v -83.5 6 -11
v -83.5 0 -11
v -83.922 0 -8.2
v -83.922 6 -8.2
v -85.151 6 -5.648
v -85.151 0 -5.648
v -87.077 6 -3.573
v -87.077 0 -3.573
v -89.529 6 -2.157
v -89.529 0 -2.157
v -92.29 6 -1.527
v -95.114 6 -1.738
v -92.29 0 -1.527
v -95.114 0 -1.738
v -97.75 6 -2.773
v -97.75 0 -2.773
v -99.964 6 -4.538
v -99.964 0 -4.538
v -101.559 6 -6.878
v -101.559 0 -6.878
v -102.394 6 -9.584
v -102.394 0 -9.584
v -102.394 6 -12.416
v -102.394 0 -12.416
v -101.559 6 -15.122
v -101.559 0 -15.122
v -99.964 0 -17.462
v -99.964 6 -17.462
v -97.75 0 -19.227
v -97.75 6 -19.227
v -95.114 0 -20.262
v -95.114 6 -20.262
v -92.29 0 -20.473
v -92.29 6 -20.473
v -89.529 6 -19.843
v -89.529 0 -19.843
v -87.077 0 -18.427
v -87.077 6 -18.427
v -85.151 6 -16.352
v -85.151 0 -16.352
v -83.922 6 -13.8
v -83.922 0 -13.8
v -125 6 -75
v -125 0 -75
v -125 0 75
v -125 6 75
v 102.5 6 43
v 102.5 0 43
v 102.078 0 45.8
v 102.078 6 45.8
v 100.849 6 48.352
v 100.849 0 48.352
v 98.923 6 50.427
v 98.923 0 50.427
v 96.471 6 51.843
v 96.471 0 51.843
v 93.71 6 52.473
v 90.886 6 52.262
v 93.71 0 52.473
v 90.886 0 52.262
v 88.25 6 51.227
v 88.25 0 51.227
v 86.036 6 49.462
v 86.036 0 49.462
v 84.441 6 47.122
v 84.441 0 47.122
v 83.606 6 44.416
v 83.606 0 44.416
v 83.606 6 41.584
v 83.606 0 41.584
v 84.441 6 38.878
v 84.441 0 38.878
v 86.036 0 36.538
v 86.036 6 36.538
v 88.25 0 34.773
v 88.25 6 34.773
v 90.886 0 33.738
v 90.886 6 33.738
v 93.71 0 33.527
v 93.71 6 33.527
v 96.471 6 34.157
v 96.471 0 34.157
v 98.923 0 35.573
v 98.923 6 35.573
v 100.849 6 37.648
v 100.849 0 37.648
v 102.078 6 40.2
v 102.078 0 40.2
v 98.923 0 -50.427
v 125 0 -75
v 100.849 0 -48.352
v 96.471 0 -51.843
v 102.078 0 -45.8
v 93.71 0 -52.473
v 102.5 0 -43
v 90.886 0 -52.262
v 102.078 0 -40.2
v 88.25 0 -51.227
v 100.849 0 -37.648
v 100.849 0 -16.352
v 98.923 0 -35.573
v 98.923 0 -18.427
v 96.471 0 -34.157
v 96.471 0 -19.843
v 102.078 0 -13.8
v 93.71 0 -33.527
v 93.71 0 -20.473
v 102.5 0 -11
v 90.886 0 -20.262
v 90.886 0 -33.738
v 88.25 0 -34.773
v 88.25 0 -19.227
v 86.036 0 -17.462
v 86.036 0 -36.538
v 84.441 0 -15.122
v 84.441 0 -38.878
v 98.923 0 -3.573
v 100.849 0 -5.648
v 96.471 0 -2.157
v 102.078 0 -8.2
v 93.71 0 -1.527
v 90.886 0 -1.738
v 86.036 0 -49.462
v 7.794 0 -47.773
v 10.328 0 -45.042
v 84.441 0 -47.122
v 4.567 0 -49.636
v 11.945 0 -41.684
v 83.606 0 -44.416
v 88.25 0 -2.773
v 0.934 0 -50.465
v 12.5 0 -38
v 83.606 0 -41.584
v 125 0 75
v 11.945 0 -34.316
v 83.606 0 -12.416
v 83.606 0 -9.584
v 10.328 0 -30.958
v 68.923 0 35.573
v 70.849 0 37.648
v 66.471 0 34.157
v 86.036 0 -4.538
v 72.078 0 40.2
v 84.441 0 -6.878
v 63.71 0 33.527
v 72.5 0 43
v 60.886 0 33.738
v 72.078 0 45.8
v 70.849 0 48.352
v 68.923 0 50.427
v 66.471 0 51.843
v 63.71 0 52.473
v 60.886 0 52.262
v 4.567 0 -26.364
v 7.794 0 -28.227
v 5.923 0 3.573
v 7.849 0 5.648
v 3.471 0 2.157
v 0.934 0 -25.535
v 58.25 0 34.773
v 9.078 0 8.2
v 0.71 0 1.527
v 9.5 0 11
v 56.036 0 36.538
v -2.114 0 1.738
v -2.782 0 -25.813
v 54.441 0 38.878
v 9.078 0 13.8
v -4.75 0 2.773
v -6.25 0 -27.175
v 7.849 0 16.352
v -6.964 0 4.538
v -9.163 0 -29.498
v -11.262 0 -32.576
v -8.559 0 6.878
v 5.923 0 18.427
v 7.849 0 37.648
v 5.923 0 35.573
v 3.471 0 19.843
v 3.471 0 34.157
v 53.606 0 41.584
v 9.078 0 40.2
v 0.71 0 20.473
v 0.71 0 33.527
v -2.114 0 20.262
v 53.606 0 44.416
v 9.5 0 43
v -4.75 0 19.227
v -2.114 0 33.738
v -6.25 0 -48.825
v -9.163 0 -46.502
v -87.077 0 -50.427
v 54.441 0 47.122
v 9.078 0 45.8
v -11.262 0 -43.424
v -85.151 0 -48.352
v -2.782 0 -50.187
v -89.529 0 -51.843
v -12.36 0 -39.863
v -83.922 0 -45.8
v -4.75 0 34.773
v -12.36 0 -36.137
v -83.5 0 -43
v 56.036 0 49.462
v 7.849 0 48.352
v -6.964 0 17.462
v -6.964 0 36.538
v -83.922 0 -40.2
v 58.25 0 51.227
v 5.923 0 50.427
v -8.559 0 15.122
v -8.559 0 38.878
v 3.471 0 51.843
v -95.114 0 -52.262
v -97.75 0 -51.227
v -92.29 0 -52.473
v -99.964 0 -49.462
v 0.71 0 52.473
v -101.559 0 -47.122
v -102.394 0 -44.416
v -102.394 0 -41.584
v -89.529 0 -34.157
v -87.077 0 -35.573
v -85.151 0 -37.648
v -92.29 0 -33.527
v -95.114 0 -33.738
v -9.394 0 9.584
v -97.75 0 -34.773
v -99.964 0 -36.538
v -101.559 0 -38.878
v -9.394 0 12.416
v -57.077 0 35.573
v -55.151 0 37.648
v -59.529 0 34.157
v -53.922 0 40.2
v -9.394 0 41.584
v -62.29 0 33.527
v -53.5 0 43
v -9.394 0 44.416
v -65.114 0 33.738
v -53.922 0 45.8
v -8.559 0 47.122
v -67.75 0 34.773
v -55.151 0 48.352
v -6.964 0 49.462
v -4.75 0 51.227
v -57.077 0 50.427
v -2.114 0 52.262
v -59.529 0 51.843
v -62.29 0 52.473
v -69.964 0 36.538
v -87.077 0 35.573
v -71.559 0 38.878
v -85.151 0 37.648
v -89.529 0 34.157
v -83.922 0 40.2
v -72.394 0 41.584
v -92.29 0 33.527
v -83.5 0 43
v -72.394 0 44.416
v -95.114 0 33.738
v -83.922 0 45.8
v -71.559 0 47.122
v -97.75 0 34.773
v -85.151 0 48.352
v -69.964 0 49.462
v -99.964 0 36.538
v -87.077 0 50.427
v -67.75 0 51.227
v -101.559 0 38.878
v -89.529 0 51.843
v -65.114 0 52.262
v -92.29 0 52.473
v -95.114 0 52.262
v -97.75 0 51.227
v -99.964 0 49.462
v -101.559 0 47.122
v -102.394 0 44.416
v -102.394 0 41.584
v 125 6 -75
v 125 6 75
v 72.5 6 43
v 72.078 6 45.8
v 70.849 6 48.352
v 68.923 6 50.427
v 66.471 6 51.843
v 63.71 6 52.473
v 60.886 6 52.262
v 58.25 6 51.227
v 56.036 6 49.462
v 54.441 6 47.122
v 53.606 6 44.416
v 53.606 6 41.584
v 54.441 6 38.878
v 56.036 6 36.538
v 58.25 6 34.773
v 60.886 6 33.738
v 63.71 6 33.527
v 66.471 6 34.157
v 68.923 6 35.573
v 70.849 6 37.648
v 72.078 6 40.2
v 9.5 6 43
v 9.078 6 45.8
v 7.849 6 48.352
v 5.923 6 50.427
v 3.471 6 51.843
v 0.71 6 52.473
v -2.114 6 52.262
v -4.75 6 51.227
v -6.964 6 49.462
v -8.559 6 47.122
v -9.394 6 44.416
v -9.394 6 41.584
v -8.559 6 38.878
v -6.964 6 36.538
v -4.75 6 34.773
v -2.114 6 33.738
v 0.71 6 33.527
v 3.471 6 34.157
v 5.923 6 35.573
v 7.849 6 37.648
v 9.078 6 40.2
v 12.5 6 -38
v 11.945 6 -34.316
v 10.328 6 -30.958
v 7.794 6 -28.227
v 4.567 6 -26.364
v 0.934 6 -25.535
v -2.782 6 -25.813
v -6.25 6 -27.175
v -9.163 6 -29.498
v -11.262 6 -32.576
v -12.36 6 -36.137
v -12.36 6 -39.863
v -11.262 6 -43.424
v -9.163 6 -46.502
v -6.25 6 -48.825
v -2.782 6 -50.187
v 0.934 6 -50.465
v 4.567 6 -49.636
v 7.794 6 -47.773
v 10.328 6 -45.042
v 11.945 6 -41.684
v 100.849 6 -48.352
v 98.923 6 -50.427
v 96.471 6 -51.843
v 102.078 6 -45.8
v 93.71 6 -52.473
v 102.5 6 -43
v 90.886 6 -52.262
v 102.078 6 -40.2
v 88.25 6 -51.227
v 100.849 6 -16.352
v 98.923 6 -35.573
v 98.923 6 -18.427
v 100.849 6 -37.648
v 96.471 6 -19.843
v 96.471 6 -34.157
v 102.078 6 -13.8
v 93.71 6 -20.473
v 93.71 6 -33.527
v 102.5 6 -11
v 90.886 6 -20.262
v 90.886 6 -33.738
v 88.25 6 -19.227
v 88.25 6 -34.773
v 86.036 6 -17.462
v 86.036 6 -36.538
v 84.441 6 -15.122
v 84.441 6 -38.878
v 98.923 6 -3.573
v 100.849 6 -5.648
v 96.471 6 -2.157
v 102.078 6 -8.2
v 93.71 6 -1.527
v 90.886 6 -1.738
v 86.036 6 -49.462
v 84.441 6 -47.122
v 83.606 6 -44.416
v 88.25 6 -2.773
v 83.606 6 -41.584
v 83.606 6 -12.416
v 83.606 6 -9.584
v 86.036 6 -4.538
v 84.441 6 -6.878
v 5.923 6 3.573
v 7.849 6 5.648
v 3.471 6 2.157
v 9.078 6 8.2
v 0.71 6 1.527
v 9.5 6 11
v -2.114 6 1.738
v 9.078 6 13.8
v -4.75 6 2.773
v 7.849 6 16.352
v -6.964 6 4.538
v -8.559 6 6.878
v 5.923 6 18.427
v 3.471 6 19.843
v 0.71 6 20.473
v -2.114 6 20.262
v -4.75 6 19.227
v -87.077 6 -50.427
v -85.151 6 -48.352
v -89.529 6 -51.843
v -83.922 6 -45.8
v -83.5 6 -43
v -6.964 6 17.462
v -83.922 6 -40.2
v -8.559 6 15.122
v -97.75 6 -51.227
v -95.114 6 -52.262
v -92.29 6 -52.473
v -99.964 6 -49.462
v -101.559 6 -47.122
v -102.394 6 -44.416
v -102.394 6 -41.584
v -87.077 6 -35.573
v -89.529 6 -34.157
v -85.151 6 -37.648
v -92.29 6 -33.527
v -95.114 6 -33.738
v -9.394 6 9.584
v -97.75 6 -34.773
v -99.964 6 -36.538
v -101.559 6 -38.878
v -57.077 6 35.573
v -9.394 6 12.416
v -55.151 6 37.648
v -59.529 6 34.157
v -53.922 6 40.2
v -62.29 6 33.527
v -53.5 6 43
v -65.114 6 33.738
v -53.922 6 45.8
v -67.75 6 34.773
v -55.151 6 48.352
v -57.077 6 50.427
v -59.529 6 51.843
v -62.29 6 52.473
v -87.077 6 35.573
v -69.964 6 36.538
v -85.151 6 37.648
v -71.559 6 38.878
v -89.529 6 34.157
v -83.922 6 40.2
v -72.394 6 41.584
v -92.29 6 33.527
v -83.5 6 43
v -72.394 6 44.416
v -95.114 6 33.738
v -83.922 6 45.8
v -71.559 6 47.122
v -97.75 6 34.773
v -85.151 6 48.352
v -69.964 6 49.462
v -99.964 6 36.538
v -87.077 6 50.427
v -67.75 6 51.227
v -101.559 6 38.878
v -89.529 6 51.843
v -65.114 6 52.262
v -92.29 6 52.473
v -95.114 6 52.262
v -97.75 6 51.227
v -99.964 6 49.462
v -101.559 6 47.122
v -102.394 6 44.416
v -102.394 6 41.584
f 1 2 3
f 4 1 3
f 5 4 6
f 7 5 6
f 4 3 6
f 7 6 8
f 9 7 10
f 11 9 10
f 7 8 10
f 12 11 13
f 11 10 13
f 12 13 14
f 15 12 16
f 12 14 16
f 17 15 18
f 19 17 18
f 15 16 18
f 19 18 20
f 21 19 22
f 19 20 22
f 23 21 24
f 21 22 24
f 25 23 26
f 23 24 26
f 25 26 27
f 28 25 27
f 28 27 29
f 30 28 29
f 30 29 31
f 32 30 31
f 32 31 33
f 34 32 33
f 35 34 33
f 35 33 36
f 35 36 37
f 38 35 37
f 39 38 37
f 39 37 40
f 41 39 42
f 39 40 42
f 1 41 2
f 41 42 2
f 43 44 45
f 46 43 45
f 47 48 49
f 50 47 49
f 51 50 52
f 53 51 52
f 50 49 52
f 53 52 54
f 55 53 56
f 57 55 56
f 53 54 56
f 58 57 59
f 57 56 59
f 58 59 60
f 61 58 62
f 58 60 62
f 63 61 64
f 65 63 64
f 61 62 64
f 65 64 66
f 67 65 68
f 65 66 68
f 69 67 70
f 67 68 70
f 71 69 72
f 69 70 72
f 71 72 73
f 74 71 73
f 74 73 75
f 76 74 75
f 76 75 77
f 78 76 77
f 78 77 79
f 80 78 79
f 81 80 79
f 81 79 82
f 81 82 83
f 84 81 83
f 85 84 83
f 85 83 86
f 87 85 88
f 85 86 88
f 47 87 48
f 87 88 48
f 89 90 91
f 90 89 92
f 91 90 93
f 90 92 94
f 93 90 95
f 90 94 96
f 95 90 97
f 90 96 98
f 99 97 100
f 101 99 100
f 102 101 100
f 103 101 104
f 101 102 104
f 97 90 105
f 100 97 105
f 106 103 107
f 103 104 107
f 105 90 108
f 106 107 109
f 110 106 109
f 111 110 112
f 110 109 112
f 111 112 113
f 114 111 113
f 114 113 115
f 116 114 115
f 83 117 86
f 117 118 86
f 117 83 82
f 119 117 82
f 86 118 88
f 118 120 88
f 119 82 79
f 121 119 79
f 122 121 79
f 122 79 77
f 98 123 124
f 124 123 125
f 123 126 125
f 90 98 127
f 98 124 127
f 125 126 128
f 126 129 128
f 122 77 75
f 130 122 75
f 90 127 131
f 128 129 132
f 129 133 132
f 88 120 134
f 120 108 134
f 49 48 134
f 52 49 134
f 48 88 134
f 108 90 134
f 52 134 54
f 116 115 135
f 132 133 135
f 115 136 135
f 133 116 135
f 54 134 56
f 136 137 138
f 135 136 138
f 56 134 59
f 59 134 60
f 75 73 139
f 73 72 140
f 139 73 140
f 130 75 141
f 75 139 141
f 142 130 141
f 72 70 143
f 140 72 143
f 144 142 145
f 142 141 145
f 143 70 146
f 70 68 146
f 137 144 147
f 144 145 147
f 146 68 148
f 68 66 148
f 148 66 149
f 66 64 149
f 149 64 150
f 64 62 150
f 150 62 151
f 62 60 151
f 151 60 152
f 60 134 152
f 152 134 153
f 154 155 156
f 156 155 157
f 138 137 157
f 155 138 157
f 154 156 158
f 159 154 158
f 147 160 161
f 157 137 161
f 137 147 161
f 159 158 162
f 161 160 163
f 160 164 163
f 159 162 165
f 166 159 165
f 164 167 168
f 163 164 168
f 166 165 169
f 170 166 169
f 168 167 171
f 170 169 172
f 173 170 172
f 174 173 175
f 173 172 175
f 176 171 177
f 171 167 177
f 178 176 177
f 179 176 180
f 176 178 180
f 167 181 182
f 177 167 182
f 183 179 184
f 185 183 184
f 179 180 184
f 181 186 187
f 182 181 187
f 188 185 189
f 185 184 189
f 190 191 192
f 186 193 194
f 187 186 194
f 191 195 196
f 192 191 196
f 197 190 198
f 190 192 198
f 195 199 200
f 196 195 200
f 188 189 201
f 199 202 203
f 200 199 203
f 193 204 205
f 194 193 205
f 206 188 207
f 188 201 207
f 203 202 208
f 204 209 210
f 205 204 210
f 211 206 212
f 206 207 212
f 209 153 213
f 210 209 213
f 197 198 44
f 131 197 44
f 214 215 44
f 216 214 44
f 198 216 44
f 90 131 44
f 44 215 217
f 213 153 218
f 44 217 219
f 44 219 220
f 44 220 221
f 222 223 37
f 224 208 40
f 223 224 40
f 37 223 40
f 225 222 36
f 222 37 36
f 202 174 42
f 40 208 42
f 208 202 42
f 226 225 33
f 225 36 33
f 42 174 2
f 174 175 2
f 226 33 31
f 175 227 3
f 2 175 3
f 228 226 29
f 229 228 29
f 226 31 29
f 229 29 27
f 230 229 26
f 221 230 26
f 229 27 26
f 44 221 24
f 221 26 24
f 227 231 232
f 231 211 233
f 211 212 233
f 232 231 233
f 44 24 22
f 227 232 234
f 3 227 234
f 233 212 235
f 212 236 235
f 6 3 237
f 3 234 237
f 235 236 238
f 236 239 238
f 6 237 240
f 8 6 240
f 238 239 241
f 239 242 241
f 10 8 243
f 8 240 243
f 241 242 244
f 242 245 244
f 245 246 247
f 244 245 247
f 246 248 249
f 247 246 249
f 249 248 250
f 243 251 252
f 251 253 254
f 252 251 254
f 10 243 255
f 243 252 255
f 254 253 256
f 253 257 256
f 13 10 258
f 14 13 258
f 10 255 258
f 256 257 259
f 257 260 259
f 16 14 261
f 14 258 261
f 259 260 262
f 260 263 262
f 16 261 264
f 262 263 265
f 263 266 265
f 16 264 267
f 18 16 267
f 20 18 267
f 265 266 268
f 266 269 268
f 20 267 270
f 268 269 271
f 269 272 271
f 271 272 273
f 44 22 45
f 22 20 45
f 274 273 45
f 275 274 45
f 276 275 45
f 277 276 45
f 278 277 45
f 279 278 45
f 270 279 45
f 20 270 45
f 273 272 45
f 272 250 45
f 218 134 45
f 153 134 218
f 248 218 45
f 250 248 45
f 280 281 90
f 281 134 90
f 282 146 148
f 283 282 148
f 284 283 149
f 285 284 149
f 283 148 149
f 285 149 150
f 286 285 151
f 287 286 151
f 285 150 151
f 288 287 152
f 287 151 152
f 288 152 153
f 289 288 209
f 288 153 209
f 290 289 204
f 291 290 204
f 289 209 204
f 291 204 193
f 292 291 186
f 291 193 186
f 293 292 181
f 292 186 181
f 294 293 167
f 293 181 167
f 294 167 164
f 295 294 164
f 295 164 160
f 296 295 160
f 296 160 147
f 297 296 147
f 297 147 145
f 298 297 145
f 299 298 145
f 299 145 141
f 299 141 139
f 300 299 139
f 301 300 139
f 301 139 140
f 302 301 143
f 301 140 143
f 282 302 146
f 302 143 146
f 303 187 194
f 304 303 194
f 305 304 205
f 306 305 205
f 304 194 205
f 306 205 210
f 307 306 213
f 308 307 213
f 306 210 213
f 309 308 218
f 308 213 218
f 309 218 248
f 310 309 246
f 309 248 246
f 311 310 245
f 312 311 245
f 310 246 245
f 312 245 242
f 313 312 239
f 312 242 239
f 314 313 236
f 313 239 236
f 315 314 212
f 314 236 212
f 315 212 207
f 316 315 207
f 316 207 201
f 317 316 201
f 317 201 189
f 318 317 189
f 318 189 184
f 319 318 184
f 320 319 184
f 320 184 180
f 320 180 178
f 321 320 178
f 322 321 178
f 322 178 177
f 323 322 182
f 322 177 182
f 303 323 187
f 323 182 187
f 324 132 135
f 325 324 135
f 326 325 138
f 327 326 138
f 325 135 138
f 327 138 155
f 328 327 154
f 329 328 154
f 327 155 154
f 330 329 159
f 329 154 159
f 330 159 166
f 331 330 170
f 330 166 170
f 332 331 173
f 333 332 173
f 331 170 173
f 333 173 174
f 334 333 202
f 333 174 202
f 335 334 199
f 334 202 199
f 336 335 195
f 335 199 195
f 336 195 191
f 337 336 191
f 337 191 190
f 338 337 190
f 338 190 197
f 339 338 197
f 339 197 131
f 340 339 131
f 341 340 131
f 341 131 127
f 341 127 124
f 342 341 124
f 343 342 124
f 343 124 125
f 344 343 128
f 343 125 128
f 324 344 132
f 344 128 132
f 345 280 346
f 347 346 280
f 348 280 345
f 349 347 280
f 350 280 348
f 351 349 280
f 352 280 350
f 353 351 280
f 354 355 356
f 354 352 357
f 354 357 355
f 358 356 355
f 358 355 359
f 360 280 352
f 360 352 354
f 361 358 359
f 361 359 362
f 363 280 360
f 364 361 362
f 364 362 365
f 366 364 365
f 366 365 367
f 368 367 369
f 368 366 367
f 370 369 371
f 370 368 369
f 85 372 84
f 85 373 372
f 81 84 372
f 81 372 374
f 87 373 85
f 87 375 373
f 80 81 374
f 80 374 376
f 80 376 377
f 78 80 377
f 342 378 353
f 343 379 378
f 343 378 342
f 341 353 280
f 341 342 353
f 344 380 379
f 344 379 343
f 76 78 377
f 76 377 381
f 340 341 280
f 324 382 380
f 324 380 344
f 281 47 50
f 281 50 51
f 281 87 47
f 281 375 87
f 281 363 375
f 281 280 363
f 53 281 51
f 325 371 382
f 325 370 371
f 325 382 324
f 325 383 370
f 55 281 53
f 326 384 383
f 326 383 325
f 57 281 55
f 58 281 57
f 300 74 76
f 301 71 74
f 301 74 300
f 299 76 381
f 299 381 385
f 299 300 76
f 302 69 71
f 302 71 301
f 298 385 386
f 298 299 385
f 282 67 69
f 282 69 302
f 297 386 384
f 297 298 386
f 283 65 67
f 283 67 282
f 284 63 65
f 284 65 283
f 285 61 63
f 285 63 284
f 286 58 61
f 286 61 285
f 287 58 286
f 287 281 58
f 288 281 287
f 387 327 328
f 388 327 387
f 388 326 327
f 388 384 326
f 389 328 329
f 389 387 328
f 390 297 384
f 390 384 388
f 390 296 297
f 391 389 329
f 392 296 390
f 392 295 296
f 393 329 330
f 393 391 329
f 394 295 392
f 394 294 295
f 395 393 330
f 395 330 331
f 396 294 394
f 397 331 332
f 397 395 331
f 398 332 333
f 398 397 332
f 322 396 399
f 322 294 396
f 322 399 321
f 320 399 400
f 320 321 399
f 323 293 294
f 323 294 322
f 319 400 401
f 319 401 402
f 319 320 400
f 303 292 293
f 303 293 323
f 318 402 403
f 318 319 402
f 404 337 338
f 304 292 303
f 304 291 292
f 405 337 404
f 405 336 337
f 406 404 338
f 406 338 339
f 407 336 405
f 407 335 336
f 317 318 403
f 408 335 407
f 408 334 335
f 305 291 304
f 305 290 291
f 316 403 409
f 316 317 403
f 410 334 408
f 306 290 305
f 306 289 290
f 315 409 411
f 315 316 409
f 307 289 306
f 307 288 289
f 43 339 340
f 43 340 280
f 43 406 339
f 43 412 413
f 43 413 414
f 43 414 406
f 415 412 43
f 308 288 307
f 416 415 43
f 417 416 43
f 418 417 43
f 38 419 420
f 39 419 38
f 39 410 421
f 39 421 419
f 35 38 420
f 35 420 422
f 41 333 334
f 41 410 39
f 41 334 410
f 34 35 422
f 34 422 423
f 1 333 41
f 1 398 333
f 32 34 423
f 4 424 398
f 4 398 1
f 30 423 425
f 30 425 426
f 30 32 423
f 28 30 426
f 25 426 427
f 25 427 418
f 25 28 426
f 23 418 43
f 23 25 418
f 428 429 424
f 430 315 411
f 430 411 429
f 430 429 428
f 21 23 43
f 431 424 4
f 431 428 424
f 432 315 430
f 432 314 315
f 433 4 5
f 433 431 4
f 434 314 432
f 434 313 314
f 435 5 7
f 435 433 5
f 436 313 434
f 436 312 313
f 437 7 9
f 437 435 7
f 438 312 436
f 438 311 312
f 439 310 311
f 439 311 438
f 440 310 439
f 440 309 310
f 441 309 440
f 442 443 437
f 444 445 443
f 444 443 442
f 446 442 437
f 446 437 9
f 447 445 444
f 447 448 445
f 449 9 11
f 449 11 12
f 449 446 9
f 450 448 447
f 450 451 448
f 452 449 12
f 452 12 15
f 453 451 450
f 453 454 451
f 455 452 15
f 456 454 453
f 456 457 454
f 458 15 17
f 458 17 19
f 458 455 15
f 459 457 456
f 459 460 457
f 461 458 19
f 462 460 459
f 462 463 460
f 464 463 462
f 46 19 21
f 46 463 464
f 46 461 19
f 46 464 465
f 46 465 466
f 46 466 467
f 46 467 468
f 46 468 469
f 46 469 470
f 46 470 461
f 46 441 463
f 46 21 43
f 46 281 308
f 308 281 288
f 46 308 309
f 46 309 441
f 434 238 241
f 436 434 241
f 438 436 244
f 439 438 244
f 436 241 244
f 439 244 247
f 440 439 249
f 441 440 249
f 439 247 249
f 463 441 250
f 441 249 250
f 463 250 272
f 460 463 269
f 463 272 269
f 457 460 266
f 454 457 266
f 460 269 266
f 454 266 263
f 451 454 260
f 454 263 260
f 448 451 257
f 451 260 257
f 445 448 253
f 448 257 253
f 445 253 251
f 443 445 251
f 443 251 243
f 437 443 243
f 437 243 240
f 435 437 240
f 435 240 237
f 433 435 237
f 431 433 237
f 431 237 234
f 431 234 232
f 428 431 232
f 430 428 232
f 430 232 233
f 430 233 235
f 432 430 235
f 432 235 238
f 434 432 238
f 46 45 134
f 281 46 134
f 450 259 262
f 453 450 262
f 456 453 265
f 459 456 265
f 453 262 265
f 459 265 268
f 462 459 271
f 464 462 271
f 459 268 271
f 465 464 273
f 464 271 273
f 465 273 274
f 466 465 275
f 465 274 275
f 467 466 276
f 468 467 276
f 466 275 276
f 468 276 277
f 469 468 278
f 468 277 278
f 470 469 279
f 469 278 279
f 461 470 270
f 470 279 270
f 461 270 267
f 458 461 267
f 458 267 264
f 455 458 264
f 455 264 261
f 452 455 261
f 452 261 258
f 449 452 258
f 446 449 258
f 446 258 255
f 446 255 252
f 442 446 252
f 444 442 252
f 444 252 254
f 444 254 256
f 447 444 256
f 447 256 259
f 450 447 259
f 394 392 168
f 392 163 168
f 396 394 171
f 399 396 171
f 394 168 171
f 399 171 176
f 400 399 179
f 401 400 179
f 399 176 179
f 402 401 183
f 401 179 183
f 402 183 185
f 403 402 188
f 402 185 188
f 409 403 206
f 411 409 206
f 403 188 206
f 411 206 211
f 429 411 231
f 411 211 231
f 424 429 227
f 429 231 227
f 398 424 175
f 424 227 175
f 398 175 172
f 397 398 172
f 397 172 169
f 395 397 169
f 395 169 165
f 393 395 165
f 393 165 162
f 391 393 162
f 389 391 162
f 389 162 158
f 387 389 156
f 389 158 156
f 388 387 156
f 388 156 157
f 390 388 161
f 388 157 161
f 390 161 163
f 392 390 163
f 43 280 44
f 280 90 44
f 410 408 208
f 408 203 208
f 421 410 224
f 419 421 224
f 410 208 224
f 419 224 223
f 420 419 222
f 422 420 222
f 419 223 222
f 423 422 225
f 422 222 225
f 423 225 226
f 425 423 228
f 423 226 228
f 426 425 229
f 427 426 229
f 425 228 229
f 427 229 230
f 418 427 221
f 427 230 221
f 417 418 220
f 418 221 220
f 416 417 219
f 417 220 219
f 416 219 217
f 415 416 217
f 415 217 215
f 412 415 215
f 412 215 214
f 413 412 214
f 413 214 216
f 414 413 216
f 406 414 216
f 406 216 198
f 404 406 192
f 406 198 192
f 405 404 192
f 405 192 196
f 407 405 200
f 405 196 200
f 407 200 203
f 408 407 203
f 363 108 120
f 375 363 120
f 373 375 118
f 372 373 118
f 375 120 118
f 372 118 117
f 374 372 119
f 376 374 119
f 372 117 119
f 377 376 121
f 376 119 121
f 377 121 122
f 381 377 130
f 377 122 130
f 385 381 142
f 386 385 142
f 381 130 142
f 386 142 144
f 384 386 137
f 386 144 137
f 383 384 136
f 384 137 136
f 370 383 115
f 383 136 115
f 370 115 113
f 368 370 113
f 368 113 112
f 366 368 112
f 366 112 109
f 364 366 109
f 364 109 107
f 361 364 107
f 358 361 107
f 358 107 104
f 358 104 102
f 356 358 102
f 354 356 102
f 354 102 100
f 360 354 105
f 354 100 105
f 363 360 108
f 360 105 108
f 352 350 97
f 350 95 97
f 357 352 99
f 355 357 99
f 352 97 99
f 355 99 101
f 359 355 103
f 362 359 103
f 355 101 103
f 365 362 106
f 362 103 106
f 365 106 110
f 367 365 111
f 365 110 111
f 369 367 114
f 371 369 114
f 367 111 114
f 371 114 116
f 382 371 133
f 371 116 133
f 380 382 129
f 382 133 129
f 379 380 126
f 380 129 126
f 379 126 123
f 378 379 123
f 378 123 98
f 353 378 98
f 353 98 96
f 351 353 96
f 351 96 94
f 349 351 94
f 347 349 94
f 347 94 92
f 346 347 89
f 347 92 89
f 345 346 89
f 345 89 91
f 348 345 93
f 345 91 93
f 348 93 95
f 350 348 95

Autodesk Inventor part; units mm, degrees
ref_plane "YZ Plane" through (0, 0, 0) normal (1, 0, 0) x (0, 1, 0)
ref_plane "XZ Plane" through (0, 0, 0) normal (0, 1, 0) x (-1, 0, 0)
ref_plane "XY Plane" through (0, 0, 0) normal (0, 0, 1) x (1, 0, 0)
sketch "Skizze1" plane through (0, 0, 0) normal (0, 1, 0) x (-1, 0, 0)
  line L0 (125, 75) -> (-125, 75)
  line L1 (-125, 75) -> (-125, -75)
  line L2 (-125, -75) -> (125, -75)
  line L3 (125, -75) -> (125, 75)
  point P0 (0, 0)
  point P1 (0, -75)
  point P2 (125, 0)
  dimension "d0" = 250
  dimension "d1" = 150
extrude "Extrusion1" add sketch "Skizze1" along normal blind 6
sketch "Skizze2" plane through (0, 0, 0) normal (0, -1, 0) x (1, 0, 0)
  circle A0 centre (0, -38) radius 12.5
  circle A1 centre (-93, -43) radius 9.5
  circle A2 centre (-93, -11) radius 9.5
  circle A3 centre (93, -43) radius 9.5
  circle A4 centre (93, -11) radius 9.5
  circle A5 centre (93, 43) radius 9.5
  circle A6 centre (-63, 43) radius 9.5
  circle A7 centre (63, 43) radius 9.5
  circle A8 centre (-93, 43) radius 9.5
  line L0 (125, 75) -> (125, -75) projected
  line L1 (-125, 75) -> (125, 75) projected
  line L2 (-125, -75) -> (-125, 75) projected
  line L3 (125, -75) -> (-125, -75) projected
  line L4 (-113, 63) -> (113, 63) construction
  line L5 (113, 63) -> (113, -63) construction
  line L6 (113, -63) -> (-113, -63) construction
  line L7 (-113, -63) -> (-113, 63) construction
  line L8 (-93, -11) -> (-93, -43) construction
  line L9 (93, -11) -> (93, -43) construction
  circle A9 centre (93, -43) radius 12.5 construction
  circle A10 centre (93, 43) radius 12.5 construction
  circle A11 centre (63, 43) radius 12.5 construction
  circle A12 centre (0, 43) radius 9.5
  circle A13 centre (0, 11) radius 9.5
  line L10 (0, 43) -> (0, 11) construction
  circle A14 centre (0, -38) radius 16 construction
  point P0 (0, 0)
  point P1 (93, -27)
  point P2 (-93, -27)
  point P3 (0, 10.7432)
  point P4 (0, -63)
  dimension "d4" = 25
  dimension "d5" = 19
  dimension "d6" = 19
  dimension "d7" = 19
  dimension "d8" = 19
  dimension "d9" = 19
  dimension "d10" = 19
  dimension "d11" = 19
  dimension "d12" = 19
  dimension "d13" = 12
  dimension "d14" = 12
  dimension "d15" = 12
  dimension "d16" = 12
  dimension "d19" = 32
  dimension "d20" = 20
  dimension "d21" = 20
  dimension "d22" = 20
  dimension "d23" = 25
  dimension "d25" = 20
  dimension "d26" = 25
  dimension "d27" = 25
  dimension "d28" = 30
  dimension "d30" = 30
  dimension "d33" = 32
  dimension "d34" = 25
extrude "Extrusion2" cut sketch "Skizze2" against normal through all contours A0 | A1 | A2 | A3 | A4 | A5 | A6 | A7 | A8 | A12 | A13
properties part number "Grundplatte_Konsole" material "Holz (Kirsche)"
